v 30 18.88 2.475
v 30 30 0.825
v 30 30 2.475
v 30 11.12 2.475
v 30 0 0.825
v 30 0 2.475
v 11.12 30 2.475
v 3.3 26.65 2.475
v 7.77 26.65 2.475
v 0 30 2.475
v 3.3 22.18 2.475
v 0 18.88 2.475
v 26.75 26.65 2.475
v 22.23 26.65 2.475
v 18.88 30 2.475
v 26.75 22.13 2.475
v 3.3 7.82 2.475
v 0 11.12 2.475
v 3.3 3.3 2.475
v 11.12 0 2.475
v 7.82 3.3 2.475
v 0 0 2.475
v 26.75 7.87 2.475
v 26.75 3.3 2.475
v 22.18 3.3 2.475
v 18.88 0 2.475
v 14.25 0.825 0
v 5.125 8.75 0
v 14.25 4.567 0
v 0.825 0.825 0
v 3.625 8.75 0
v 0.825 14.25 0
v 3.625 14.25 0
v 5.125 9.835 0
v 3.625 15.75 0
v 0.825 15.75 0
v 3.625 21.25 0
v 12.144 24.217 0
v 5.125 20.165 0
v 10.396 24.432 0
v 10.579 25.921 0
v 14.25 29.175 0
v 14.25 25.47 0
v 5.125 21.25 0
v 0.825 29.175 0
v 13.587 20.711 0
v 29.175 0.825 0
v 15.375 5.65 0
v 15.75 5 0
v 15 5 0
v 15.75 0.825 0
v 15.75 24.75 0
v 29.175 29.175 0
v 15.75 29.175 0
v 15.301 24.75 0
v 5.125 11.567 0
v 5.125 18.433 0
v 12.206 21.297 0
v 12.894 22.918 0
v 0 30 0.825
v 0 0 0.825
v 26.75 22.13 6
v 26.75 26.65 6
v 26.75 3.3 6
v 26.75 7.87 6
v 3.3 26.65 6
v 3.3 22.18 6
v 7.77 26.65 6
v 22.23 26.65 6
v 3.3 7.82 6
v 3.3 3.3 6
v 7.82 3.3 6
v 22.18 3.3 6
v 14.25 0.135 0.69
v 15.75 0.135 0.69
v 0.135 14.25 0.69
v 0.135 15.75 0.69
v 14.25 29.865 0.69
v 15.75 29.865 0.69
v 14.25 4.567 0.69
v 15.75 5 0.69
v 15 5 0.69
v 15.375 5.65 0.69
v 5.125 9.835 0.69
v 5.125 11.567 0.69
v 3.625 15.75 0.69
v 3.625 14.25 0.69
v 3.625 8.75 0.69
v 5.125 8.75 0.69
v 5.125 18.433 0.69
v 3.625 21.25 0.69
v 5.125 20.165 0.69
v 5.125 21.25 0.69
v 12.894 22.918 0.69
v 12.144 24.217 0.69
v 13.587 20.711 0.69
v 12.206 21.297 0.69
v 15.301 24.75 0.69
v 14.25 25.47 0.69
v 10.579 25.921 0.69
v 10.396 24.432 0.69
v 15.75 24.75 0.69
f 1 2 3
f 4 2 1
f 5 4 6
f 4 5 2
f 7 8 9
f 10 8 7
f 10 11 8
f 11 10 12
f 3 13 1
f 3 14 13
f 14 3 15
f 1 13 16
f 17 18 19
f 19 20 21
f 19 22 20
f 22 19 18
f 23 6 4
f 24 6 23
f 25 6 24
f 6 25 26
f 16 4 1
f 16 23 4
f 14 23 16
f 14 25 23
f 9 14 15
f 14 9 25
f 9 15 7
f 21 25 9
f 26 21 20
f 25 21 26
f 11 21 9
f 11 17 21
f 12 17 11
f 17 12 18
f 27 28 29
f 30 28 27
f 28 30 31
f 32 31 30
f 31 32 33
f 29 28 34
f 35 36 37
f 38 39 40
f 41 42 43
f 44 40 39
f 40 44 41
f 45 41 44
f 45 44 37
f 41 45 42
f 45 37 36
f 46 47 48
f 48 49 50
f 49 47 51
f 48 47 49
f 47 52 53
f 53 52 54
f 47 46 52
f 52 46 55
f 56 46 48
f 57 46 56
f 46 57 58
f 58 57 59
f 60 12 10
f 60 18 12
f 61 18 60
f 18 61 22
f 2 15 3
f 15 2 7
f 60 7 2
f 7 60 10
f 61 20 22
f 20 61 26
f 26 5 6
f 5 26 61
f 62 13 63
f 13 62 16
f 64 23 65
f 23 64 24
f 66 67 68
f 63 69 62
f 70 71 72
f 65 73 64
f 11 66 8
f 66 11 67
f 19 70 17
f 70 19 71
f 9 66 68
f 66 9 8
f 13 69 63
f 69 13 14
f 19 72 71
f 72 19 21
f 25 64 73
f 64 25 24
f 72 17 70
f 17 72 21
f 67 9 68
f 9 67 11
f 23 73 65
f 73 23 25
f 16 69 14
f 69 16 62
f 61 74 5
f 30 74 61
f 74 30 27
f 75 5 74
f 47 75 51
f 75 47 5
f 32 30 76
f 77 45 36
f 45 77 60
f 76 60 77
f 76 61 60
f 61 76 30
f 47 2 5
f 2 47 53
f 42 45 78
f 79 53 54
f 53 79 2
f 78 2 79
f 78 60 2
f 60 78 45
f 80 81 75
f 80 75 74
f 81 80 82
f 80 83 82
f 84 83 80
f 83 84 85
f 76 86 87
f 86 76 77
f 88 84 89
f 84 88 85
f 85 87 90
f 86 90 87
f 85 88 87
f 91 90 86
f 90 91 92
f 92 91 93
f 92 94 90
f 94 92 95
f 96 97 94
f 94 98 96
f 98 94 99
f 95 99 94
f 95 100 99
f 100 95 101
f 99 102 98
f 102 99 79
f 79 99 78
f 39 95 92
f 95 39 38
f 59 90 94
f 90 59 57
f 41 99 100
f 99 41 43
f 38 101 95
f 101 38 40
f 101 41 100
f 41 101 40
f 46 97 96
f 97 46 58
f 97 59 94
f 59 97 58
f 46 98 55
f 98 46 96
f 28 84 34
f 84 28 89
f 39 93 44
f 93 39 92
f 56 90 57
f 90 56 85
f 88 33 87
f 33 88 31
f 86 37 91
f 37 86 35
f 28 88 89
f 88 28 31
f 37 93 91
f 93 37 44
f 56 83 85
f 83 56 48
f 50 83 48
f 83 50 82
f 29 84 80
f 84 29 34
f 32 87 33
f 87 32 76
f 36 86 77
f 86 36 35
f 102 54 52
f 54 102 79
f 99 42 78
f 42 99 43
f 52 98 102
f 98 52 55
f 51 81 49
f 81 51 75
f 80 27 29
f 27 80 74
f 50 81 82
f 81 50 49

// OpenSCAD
// file: sym_arrow.scad
module arrow(thickness, length, size, height)
{
    if (length > 0)
    {
        translate([thickness,-thickness/2,0])cube([length-thickness, thickness, height]);
        rotate([0,0,37])translate([0,-3*thickness/4])cube([size, thickness, height]);
        rotate([0,0,-37])translate([0,-thickness/4])cube([size, thickness, height]);
    }
    else
    {
        translate([0,-thickness/2, 0])cube([-length-thickness, thickness, height]);
        translate([-length,0,0]) mirror([1,0,0]) rotate([0,0,30])translate([0,-3*thickness/4,0])cube([size, thickness, height]);
        translate([-length,0,0]) mirror([1,0,0])rotate([0,0,-30])translate([0,-thickness/4])cube([size, thickness, height]);
    }
}

arrow(0.7, -20, 4.5, 1);
// file: sym_ring.scad
module ring(radius, thickness, height)
{
    difference()
    {
        cylinder(r=radius, h=height, $fn=64);
        translate([0,0,-thickness/2])cylinder(r=(radius-thickness), h=(height+thickness), $fn=64);
    }
}

ring(30, 1, 1);
// file: settings.scad
cube_width=30;
cube_height=16;
cube_thickness=3.3;

cap_width=30;
cap_height=6;
cap_thickness=3.3;

glyph_depth=0.7;
glyph_thickness=1.5;

photo_resitor_hole_r = 2.4;
spring_contact_hole_r = 3.125;
// file: sym_transistor_npn.scad
use <sym_ring.scad>
use <sym_arrow.scad>
use <sym_ring.scad>

module transistor_npn(diameter, thickness, height)
{
    //ring(0.5*diameter, thickness, height);
    //base
    translate([-1.7*diameter/4-thickness/2,-diameter/4,0])
        cube([thickness, diameter/2, height]);

    //emitter
    translate([0, -diameter/2.5, 0])rotate([0,0,150])arrow(thickness, 4*diameter/8, 3*thickness, height);

    //collector
    translate([0, diameter/2.5, 0])rotate([0,0,120])translate([-thickness/2,0,0])cube([thickness, 4*diameter/8, height]);

    //base wire
    translate([-41*diameter/48-thickness/2, 0,0])arrow(thickness, diameter/2.22, 0, height);

    //emitter wire 
    translate([-thickness/2,-3*diameter/4-thickness/2,0])cube([thickness, 1.17*diameter/3, height]);

    //collector wire
    translate([-thickness/2, 1.6*diameter/4,0])cube([thickness, 1.3*diameter/3, height]);
}

transistor_npn(30,1.5,0.7);
// file: cap_1x1.scad
include <settings.scad>

module cap_1x1(width, height, thickness, holes_mask)
{
    width1=width-thickness;
    difference()
    {
        union()
        {
            cube([width, width, thickness*3/4]);
            translate([thickness,thickness,0])cube([width-2*(thickness-0.025), width-2*(thickness+0.025), height]);
        }
        union()
        {
            translate([width/2,width/2,0])rotate([0,0,45])translate([-width1/2,-width1/2,thickness*3/4]) cube([width1,width1,height]);
                        //corners
            translate([0,0.25*thickness,0])rotate([45,0,0]) translate([-0.5*width, -width, -0.5*height]) cube([2*width, width, 2*height]);
            translate([0.25*thickness,0,0]) rotate([0,-45,0]) translate([-width, -0.5*width, -0.5*height]) cube([width, 2*width, 2*height]);
            translate([width-0.25*thickness,0,0]) rotate([0,45,0]) translate([0, 0, -0.5*height]) cube([width, 2*width, 2*height]);
            translate([0,width-0.25*thickness,0]) rotate([-45,0,0]) translate([-0.5*width, 0, -0.5*height]) cube([2*width, width, 2*height]);
            
            if (holes_mask >= 8)
            {
                translate([width/2, thickness-1.5, -0.5]) cylinder(r=1.15, h=height*1.5, $fn=80);
            }
            if ((holes_mask%8) >= 4)
            {
                translate([width/2, width-thickness+1.5, -0.5]) cylinder(r=1.15, h=height*1.5, $fn=80);
            }
            if ((holes_mask%4)>= 2)
            {
                translate([thickness-1.5, width/2, -0.5]) cylinder(r=1.15, h=height*1.5, $fn=80);
            }
            if (holes_mask%2 >= 1)
            {
                translate([width-thickness+1.5, width/2, -0.5]) cylinder(r=1.15, h=height*1.5, $fn=80);
            }
        }
    }
}

cap_1x1(cap_width, cap_height, cap_thickness, 9);
//ring(10,1,1);
//arrow(1, 20, 3, 1);
//transistor_npn(30, 1, 1);
// main file
use <cap_1x1.scad>
use <sym_transistor_npn.scad>
include <settings.scad>

module cap_1x1_npn_transistor(width, height, thickness)
{
    difference()
    {
        cap_1x1(width, height, thickness, 0); //14
        translate([width/2,width/2,-0.01])
        mirror([0,1,0]) transistor_npn(25, glyph_thickness, glyph_depth);
    }
}

cap_1x1_npn_transistor(cap_width, cap_height, cap_thickness);
